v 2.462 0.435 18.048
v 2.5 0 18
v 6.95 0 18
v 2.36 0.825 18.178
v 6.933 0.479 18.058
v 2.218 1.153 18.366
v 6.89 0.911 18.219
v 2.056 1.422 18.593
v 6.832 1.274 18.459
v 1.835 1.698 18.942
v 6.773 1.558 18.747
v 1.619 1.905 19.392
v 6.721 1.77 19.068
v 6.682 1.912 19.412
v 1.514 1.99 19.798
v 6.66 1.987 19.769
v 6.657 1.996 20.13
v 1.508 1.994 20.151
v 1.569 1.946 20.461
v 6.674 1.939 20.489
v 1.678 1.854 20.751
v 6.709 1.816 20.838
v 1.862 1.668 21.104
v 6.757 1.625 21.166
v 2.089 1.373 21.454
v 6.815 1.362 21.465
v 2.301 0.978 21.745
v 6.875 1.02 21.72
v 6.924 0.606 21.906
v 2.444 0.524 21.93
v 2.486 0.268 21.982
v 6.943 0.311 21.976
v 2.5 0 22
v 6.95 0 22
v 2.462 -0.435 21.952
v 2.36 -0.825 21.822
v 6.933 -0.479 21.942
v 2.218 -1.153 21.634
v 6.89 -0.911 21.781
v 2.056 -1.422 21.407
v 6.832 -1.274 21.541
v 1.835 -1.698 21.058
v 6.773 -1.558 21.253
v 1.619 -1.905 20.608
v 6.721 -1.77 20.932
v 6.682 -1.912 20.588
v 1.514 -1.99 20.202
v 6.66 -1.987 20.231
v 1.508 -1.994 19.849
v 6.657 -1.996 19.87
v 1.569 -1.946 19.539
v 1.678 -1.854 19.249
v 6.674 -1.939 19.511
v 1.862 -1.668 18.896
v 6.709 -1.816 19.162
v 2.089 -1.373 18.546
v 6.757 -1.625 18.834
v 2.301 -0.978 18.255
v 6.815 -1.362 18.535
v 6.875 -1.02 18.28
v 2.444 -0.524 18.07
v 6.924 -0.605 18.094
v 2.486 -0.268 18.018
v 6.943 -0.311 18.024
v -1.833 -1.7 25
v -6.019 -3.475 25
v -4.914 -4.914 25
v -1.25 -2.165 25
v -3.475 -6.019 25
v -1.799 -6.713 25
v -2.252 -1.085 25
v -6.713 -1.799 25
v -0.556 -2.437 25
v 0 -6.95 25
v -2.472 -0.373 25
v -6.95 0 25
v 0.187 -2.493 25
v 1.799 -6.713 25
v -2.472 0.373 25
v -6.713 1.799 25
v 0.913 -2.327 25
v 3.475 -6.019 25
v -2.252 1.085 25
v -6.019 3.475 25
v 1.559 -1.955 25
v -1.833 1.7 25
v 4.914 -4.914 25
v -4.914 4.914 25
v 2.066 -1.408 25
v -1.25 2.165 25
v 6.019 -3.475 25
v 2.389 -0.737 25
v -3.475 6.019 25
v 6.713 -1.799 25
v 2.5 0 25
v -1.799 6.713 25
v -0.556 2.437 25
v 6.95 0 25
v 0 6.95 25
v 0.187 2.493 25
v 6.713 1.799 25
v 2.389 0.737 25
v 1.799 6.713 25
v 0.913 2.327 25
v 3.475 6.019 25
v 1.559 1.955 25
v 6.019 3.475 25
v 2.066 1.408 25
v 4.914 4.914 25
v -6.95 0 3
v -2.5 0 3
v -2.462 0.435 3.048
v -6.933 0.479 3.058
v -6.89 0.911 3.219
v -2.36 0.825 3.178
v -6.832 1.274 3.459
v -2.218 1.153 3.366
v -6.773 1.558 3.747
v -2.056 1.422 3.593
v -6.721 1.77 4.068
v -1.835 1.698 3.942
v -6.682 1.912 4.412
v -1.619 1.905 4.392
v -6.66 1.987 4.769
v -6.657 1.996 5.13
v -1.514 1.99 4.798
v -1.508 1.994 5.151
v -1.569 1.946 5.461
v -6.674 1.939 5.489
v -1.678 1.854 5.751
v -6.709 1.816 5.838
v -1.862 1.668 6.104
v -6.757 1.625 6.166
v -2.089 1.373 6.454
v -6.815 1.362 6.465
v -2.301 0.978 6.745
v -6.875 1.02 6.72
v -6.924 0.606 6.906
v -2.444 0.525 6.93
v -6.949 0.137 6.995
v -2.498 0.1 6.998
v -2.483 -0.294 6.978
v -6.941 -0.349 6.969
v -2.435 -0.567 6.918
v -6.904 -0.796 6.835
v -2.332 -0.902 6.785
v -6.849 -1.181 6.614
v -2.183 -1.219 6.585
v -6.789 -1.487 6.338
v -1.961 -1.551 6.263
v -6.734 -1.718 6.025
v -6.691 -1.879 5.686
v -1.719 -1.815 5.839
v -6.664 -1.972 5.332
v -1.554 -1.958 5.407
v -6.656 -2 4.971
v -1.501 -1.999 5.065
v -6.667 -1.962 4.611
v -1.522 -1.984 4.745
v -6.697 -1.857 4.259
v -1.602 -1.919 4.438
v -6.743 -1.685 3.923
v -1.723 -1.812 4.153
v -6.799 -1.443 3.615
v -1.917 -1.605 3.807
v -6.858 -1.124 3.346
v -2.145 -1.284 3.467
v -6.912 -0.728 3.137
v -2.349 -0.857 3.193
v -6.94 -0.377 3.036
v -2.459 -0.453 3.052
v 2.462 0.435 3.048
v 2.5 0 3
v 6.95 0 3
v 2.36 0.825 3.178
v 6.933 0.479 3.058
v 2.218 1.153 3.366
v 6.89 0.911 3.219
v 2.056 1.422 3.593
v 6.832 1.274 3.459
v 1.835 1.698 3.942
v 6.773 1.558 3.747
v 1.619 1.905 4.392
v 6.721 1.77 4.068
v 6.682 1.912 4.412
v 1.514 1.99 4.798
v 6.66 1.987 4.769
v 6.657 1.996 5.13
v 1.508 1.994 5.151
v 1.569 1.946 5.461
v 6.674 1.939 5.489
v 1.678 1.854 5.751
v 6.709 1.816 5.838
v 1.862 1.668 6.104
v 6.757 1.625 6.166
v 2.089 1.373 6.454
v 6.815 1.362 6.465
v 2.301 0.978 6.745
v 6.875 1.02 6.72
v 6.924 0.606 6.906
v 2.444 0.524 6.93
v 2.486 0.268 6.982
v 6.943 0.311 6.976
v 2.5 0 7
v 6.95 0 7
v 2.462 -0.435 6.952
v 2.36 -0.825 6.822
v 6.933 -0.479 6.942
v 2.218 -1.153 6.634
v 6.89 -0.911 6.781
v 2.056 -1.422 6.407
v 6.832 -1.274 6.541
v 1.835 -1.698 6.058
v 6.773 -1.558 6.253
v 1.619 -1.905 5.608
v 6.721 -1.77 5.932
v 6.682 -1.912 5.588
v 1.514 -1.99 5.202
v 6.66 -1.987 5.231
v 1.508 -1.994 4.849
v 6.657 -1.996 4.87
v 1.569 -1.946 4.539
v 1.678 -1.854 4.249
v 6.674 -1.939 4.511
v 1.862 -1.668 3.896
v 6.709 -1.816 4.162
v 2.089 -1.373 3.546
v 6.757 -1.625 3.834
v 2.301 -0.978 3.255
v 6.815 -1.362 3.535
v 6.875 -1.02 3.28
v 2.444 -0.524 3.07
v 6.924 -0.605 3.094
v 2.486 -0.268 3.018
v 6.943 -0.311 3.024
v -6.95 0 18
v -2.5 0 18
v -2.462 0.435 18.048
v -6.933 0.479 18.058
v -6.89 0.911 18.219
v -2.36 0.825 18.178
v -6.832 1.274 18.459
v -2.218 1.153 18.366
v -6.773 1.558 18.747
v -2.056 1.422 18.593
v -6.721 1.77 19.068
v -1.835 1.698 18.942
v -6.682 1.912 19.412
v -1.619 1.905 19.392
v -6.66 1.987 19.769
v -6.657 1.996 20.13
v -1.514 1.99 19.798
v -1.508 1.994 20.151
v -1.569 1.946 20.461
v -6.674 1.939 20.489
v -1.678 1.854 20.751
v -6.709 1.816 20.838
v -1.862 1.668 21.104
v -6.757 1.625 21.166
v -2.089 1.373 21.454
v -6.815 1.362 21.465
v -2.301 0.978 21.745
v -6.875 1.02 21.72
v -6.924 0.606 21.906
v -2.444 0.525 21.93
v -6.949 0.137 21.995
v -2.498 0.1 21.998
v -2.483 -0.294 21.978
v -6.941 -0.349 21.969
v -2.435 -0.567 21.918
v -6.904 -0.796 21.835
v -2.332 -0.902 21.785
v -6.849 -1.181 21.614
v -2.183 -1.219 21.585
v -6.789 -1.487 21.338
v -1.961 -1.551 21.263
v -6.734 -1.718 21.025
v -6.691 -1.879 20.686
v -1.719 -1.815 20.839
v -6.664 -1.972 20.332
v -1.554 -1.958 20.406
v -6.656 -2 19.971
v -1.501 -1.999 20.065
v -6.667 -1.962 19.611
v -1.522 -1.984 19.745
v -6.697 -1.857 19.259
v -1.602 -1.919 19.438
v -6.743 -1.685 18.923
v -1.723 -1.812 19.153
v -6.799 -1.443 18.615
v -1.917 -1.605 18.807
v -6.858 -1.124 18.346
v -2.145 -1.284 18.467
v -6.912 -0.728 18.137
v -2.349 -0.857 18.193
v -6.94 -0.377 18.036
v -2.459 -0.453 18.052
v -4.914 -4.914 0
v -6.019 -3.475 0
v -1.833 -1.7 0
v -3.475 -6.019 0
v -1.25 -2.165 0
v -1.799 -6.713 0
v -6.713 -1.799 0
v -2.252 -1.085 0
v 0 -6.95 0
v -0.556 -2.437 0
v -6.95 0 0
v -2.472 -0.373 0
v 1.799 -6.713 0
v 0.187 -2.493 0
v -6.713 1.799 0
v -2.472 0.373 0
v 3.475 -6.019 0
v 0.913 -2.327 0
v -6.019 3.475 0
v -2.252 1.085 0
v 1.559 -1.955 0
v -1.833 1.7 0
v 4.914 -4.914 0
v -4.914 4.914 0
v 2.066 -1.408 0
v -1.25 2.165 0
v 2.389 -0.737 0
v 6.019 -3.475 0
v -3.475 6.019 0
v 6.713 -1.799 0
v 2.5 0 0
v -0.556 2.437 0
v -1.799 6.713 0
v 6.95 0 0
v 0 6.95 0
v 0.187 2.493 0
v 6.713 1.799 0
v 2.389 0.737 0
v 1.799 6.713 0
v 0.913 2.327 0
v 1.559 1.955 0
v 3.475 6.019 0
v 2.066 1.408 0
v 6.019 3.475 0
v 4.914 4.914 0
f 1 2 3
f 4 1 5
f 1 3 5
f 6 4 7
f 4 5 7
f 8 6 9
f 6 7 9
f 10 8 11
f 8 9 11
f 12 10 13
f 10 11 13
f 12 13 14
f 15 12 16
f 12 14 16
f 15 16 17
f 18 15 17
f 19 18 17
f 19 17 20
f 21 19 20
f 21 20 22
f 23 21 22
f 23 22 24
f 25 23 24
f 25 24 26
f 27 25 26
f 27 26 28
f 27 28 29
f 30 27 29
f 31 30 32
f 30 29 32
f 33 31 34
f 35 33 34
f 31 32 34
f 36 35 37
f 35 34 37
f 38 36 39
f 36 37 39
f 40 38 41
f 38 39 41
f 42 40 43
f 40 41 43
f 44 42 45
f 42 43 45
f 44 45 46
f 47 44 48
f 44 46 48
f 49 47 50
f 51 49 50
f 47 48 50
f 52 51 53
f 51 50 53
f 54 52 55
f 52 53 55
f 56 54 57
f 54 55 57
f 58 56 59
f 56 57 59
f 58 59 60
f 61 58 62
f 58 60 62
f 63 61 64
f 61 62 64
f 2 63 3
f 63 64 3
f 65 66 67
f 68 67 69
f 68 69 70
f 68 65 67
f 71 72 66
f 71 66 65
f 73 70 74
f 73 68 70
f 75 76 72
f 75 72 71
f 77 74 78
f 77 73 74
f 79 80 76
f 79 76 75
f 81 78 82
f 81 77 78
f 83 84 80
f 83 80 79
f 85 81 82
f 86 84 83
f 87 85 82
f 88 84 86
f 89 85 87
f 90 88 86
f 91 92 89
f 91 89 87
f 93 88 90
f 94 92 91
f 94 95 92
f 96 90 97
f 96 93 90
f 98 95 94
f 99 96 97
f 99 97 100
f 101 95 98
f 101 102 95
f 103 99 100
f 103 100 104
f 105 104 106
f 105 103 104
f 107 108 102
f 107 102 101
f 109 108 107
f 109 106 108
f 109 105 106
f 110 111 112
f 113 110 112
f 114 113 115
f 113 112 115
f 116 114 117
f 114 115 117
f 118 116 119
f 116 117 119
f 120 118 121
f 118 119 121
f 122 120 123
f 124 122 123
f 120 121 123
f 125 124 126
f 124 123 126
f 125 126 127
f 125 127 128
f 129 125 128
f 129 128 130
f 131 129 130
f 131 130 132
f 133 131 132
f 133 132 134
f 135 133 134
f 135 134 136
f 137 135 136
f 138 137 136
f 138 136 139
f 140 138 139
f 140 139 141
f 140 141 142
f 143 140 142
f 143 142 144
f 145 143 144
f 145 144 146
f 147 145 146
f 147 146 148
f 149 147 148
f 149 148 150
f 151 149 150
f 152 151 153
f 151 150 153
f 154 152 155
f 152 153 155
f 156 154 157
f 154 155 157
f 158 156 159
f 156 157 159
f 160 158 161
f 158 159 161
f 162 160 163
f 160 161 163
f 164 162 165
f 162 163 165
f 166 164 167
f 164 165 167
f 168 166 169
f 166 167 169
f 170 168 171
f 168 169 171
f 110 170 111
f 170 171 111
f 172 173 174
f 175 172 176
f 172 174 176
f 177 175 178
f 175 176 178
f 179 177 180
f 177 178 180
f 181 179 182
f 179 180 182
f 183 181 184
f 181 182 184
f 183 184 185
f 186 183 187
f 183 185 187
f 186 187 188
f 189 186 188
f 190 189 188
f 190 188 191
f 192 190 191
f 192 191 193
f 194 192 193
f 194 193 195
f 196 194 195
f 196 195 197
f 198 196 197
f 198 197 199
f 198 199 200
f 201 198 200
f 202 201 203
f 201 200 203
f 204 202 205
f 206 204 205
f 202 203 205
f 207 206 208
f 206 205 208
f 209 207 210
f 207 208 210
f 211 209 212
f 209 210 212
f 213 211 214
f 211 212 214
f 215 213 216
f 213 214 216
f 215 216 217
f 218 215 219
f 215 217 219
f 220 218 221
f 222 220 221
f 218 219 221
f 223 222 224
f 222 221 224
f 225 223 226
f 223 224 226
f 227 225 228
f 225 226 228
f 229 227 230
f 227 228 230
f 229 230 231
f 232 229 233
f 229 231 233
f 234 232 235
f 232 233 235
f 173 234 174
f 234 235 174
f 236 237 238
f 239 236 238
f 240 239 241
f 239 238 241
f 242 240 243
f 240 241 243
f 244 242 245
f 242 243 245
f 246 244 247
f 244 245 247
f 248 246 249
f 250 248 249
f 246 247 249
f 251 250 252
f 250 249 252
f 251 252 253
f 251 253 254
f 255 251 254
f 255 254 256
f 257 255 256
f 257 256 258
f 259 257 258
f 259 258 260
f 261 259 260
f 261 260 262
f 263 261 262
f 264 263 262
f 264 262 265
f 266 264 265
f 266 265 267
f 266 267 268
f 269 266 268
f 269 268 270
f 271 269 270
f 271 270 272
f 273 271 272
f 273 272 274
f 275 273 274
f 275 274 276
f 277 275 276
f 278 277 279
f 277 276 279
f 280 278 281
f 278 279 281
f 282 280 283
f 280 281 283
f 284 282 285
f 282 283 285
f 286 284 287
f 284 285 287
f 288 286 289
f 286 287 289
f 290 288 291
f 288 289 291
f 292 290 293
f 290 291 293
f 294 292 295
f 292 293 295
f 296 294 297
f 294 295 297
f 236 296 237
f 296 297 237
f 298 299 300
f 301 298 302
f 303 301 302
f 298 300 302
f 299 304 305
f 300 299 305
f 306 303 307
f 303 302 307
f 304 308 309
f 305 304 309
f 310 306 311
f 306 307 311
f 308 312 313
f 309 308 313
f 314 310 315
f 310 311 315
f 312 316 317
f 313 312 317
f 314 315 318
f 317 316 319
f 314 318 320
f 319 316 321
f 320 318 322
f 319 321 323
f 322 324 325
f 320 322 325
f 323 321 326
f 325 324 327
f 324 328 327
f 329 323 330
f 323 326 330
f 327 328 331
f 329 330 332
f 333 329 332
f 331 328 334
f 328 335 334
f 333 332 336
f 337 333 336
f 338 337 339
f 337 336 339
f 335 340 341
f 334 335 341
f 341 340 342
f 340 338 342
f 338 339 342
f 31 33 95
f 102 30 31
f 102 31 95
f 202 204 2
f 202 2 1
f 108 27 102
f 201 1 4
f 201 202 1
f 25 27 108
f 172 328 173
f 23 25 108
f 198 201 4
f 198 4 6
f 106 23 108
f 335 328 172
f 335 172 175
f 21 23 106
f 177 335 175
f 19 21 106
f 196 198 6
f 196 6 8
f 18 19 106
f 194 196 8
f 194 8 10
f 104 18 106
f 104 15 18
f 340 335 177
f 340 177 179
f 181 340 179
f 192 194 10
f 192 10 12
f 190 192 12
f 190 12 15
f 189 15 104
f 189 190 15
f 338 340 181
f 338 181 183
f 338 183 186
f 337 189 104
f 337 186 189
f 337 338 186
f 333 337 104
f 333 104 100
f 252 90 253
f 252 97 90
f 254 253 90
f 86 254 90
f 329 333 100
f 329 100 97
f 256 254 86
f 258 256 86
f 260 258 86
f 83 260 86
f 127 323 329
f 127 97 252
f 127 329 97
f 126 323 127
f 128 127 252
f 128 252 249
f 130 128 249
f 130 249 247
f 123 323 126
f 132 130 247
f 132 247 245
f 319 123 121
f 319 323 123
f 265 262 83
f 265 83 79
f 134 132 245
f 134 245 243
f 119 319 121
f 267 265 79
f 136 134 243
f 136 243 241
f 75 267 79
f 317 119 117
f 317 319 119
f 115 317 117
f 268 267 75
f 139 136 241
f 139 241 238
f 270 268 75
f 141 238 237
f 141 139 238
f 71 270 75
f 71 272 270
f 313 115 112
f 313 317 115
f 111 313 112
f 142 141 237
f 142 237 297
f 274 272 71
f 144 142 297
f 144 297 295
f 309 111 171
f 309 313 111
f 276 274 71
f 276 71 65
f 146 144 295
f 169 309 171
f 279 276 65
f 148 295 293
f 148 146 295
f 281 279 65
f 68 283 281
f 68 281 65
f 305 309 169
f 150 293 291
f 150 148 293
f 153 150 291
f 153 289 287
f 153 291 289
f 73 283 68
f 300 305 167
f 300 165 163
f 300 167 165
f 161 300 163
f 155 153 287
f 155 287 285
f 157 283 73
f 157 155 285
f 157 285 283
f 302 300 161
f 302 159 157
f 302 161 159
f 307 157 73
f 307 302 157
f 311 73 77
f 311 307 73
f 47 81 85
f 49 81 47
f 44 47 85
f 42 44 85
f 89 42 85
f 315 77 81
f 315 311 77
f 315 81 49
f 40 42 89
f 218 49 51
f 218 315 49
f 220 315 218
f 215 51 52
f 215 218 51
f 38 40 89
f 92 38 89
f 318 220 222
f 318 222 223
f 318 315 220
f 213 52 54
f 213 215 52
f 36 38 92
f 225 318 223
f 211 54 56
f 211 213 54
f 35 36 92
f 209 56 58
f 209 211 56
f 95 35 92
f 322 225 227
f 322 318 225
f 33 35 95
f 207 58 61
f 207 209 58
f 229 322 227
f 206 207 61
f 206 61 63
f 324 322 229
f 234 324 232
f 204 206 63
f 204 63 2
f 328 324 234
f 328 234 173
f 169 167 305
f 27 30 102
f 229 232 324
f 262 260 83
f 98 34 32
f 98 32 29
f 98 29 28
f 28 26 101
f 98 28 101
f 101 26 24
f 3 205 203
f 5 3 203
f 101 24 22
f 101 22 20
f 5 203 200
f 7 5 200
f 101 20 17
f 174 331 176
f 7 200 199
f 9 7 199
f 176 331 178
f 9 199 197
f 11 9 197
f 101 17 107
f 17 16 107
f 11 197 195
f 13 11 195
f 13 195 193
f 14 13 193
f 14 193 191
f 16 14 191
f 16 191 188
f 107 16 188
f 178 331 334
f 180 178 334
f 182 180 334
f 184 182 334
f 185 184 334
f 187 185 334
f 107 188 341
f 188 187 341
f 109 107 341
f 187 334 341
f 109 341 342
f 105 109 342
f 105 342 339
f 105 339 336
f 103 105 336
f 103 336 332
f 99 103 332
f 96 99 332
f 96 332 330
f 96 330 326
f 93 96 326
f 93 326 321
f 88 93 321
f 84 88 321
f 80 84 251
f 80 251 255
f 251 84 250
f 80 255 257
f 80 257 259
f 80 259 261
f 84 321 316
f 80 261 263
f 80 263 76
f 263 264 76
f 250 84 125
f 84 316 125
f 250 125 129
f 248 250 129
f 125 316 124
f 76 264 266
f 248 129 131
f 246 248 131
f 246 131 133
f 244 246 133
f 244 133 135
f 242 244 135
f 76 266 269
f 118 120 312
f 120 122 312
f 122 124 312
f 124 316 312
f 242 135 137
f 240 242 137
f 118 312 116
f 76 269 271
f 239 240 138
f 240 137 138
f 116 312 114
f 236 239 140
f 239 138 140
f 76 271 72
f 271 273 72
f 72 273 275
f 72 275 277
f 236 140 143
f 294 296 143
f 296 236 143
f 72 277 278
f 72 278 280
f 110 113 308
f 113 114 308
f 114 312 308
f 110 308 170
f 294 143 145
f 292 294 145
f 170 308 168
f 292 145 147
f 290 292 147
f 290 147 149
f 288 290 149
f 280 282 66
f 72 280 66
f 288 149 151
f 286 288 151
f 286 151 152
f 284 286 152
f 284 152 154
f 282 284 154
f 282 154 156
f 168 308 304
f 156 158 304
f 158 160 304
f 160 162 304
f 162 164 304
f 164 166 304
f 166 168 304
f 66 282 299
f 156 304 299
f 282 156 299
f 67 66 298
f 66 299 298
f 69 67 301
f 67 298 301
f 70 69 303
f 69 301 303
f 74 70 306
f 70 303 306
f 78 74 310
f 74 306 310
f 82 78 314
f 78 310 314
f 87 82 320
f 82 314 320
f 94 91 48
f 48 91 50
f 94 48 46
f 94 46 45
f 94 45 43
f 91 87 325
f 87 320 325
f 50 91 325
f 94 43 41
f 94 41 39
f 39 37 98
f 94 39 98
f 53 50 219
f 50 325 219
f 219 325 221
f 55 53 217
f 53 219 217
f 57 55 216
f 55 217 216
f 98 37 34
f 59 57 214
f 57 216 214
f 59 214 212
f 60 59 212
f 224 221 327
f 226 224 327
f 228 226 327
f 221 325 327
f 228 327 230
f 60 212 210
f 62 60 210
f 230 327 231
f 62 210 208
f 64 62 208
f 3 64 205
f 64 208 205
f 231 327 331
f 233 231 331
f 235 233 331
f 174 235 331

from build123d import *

# Parameters (mm, degrees)
SKETCH_1_R          = 6.95
SKETCH_1_R_2        = 2.5
EXTRUDE_1_DEPTH     = 25
SKETCH_2_R          = 2
CUT_EXTRUDE_1_DEPTH = 30.436584381


with BuildPart() as part:
    # 草图1 → 凸台-拉伸1 (new body)
    with BuildSketch(Plane.XY):
        Circle(SKETCH_1_R)
        Circle(SKETCH_1_R_2, mode=Mode.SUBTRACT)
    extrude(amount=EXTRUDE_1_DEPTH)

    # 草图2 → 切除-拉伸1 (cut, through all)
    with BuildSketch(Plane(origin=(6.95, 0, 0), x_dir=(0, 0, -1), z_dir=(1, 0, 0))):
        with Locations((-5, 0)):
            Circle(SKETCH_2_R)
        with Locations((-20, 0)):
            Circle(SKETCH_2_R)
    extrude(amount=-CUT_EXTRUDE_1_DEPTH, mode=Mode.SUBTRACT)


solid = part.part
